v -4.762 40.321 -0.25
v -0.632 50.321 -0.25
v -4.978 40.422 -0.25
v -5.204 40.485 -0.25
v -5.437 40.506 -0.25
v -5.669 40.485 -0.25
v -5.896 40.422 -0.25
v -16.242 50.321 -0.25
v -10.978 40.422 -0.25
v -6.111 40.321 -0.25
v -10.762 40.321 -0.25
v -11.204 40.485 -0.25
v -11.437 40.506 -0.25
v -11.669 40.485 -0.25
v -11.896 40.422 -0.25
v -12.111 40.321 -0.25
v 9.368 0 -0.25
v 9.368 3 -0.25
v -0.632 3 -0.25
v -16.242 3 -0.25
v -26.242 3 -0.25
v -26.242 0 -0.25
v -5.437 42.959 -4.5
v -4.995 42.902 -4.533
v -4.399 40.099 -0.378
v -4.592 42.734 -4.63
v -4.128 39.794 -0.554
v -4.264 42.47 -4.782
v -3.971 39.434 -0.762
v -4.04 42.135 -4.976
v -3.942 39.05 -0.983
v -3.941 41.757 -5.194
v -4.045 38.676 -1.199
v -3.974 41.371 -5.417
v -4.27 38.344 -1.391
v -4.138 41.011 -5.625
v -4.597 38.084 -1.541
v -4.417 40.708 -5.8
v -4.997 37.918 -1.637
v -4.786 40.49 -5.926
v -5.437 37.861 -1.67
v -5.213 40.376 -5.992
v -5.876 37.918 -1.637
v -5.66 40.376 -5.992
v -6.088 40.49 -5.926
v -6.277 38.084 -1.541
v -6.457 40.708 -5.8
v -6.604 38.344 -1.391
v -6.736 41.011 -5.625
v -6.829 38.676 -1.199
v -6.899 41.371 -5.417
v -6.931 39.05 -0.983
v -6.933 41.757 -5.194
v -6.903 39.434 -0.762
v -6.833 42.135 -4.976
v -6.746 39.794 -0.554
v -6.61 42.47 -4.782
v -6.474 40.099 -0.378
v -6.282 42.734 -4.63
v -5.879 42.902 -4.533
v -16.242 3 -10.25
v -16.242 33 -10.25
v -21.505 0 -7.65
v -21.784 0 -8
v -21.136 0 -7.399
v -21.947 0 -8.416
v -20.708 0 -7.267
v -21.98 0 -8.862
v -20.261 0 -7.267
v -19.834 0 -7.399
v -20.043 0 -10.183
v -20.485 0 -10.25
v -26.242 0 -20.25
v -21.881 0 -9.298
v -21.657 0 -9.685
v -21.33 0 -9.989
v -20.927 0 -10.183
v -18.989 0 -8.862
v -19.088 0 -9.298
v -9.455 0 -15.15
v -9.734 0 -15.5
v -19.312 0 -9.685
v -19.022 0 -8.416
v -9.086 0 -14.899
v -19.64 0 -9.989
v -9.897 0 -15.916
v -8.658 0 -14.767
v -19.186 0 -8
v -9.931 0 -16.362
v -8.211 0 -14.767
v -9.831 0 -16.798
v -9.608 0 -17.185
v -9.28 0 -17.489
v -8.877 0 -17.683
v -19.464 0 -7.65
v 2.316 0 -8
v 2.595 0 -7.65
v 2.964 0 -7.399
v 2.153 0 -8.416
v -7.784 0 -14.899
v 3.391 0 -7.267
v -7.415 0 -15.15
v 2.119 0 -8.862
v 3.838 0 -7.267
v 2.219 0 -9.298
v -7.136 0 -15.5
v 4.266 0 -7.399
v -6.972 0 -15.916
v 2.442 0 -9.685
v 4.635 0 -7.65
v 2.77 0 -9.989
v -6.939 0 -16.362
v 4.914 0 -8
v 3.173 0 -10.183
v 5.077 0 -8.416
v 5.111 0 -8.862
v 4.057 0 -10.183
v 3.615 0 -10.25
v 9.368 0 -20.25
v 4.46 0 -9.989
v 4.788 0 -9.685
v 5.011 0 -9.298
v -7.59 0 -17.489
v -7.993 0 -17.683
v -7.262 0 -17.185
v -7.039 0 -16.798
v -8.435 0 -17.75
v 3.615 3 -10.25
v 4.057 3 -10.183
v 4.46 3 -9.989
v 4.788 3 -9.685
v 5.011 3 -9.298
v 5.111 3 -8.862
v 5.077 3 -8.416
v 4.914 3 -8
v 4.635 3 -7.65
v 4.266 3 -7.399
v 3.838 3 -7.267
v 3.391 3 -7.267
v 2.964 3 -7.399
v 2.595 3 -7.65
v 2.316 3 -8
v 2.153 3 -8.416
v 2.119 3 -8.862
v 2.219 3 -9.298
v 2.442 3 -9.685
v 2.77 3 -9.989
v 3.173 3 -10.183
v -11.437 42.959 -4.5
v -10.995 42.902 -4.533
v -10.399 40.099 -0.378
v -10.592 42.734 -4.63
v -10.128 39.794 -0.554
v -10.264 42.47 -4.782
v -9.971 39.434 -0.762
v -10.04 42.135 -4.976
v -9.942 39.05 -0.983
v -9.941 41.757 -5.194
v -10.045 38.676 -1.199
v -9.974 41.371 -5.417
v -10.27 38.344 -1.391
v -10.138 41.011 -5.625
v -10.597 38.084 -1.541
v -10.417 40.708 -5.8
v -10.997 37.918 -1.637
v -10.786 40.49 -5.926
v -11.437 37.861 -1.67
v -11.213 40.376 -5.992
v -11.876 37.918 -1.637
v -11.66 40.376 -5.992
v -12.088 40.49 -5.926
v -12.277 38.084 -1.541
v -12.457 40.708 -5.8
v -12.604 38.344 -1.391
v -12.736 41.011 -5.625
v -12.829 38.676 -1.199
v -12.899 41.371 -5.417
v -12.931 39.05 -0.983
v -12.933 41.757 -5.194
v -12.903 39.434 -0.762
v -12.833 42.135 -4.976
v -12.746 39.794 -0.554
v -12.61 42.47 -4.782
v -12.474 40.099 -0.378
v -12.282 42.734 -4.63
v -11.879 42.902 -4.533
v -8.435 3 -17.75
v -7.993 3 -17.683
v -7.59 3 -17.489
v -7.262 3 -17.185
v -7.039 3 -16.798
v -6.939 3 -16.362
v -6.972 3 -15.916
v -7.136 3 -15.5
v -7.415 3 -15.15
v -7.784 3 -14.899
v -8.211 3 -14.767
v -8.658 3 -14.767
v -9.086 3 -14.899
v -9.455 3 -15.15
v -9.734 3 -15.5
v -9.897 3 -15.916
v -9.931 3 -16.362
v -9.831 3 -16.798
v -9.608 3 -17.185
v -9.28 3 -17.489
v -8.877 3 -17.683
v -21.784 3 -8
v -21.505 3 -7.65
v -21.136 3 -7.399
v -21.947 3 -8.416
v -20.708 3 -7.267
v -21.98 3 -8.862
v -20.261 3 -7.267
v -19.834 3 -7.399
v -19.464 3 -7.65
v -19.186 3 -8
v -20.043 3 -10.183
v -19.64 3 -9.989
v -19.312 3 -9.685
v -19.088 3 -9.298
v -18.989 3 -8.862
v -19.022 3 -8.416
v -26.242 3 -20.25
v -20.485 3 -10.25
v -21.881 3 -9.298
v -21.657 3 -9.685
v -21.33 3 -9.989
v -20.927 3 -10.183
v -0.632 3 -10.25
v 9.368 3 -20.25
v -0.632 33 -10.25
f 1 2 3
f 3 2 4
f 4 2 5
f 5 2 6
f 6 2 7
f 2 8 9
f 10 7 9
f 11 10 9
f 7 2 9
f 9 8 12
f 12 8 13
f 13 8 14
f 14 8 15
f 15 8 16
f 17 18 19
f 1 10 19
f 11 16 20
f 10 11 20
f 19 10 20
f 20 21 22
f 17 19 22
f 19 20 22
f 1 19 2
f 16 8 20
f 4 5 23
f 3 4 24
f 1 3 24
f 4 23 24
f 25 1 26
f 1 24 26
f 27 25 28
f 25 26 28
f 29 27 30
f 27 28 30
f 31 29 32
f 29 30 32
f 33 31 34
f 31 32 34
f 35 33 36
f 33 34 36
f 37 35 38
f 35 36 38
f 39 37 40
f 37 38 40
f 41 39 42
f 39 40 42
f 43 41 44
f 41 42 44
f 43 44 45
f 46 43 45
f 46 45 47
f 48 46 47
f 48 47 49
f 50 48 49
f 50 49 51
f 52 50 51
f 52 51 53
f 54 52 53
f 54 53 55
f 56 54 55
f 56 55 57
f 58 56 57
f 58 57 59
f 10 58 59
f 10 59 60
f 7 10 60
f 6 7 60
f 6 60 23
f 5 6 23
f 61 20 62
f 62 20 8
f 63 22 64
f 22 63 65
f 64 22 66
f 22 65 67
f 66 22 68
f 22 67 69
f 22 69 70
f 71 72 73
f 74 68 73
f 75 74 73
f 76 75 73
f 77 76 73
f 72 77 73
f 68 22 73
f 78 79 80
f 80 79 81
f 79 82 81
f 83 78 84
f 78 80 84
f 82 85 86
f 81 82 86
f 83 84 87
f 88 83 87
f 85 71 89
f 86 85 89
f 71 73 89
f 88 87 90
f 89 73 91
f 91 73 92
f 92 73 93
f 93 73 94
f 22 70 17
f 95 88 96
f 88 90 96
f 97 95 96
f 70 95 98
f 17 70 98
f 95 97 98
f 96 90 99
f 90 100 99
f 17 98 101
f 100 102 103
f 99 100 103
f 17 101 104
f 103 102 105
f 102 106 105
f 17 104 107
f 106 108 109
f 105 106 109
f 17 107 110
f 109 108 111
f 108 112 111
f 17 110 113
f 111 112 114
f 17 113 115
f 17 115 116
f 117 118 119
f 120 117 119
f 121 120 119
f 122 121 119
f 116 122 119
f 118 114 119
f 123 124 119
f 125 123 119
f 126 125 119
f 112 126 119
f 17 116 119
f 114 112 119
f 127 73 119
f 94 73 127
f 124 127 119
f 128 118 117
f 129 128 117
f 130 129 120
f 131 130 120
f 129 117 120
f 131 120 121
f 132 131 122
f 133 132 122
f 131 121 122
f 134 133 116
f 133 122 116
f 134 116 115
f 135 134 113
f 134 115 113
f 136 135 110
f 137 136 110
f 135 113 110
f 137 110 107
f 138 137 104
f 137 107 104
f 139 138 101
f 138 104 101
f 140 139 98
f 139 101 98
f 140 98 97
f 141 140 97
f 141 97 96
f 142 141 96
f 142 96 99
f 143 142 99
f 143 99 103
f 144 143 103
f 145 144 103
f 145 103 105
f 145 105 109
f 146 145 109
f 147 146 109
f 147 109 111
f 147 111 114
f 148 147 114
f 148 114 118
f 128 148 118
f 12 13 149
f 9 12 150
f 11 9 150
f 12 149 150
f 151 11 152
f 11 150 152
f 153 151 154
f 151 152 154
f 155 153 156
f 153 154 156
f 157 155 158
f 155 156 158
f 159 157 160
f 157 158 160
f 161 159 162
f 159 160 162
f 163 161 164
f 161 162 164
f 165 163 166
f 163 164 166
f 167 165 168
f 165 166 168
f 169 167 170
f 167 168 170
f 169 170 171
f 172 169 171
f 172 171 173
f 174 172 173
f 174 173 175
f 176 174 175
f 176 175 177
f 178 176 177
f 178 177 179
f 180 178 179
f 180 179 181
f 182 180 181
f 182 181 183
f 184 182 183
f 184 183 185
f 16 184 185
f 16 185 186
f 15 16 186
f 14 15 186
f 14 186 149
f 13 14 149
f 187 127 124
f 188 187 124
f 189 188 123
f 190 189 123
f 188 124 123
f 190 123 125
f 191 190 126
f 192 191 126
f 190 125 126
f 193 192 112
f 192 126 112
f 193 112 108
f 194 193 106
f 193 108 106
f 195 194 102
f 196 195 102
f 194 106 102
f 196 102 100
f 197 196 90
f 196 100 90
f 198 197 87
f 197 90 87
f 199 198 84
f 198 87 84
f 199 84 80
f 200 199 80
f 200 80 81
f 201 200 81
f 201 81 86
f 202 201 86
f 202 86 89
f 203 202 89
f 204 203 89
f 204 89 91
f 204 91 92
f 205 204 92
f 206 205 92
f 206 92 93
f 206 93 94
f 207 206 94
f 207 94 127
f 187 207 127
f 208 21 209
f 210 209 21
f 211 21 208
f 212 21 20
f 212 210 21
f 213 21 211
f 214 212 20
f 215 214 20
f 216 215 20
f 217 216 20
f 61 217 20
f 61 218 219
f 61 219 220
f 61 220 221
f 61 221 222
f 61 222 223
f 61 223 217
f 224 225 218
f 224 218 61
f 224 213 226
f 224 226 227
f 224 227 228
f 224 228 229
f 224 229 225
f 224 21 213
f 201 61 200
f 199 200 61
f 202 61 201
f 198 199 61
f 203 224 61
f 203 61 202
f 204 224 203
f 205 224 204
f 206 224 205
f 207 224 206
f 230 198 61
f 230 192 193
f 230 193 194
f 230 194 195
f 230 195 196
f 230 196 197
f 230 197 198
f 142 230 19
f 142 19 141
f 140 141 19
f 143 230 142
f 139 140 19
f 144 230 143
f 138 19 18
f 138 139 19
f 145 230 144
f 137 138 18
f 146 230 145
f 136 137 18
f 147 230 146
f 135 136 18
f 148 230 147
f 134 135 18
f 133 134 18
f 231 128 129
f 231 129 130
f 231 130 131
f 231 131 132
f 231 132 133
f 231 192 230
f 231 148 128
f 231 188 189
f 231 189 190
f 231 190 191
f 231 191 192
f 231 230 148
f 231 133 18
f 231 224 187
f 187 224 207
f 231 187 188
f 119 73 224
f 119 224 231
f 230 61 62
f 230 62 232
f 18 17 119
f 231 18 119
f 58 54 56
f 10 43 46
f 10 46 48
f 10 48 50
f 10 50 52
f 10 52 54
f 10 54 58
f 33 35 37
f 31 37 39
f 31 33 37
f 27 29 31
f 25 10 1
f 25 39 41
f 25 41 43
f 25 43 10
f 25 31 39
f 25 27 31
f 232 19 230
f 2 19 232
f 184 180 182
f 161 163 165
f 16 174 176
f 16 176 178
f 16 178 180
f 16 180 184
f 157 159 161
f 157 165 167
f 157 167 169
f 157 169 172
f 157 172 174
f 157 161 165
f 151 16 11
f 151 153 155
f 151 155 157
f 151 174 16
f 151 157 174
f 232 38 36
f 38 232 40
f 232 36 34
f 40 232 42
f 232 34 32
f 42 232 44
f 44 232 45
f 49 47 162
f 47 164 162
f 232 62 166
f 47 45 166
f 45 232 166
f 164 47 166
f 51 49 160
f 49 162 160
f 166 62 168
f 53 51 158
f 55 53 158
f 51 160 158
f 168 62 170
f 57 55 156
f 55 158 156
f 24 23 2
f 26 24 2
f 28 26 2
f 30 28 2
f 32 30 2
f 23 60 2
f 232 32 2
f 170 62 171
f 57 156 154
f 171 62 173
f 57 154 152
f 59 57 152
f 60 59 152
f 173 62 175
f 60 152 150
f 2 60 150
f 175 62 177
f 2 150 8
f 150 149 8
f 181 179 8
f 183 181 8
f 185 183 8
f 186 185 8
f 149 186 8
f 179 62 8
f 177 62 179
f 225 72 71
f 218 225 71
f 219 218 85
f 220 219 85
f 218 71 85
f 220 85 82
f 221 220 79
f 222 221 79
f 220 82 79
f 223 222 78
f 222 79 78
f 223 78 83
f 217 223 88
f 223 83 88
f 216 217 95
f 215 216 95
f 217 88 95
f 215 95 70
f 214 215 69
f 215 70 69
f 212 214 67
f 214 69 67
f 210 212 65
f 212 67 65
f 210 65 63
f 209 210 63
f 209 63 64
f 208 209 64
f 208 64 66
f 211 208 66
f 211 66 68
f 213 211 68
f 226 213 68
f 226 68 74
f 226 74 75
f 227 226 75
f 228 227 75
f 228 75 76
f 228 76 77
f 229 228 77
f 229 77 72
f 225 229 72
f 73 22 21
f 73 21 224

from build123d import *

# Parameters (mm, degrees)
SKETCH1_W           = 35.61
SKETCH1_H           = 20
BOSS_EXTRUDE1_DEPTH = 3
SKETCH3_R           = 1.5
CUT_EXTRUDE1_DEPTH  = 5
SKETCH7_W           = 15.61
SKETCH7_H           = 10
BOSS_EXTRUDE4_DEPTH = 30
BOSS_EXTRUDE5_DEPTH = 15.61
SKETCH9_R           = 1.5
CUT_EXTRUDE2_DEPTH  = 5


with BuildPart() as part:
    # Sketch1 → Boss-Extrude1 (new body)
    with BuildSketch(Plane(origin=(0, 0, 0), x_dir=(1, 0, 0), z_dir=(0, 1, 0))):
        with Locations((-8.436781609, 10.25)):
            Rectangle(SKETCH1_W, SKETCH1_H)
    extrude(amount=BOSS_EXTRUDE1_DEPTH)

    # Sketch3 → Cut-Extrude1 (cut)
    with BuildSketch(Plane.XZ):
        with Locations(Location((-20.484687418, -8.75, 0), (0, 0, 270))):
            Circle(SKETCH3_R)
        with Locations(Location((-8.434877213, -16.25, 0), (0, 0, 270))):
            Circle(SKETCH3_R)
        with Locations(Location((3.614932992, -8.75, 0), (0, 0, 270))):
            Circle(SKETCH3_R)
    extrude(amount=-CUT_EXTRUDE1_DEPTH, mode=Mode.SUBTRACT)

    # Sketch7 → Boss-Extrude4 (add)
    with BuildSketch(Plane(origin=(0, 3, 0), x_dir=(1, 0, 0), z_dir=(0, 1, 0))):
        with Locations((-8.436781609, 5.25)):
            Rectangle(SKETCH7_W, SKETCH7_H)
    extrude(amount=BOSS_EXTRUDE4_DEPTH)

    # Sketch8 → Boss-Extrude5 (add)
    with BuildSketch(Plane.ZY.offset(16.241781609)):
        Polygon((-10.25, 33), (-0.25, 50.320508076), (-0.25, 33), align=None)
    extrude(amount=-BOSS_EXTRUDE5_DEPTH)

    # Sketch9 → Cut-Extrude2 (cut)
    with BuildSketch(Plane(origin=(0, 12.688380194, -21.976919162), x_dir=(1, 0, 0), z_dir=(0, 0.4999999999999978, -0.8660254037844399))):
        with Locations(Location((-11.436781609, -33.453838325, 0), (0, 0, 270))):
            Circle(SKETCH9_R)
        with Locations(Location((-5.436781609, -33.453838325, 0), (0, 0, 270))):
            Circle(SKETCH9_R)
    extrude(amount=-CUT_EXTRUDE2_DEPTH, mode=Mode.SUBTRACT)


solid = part.part
